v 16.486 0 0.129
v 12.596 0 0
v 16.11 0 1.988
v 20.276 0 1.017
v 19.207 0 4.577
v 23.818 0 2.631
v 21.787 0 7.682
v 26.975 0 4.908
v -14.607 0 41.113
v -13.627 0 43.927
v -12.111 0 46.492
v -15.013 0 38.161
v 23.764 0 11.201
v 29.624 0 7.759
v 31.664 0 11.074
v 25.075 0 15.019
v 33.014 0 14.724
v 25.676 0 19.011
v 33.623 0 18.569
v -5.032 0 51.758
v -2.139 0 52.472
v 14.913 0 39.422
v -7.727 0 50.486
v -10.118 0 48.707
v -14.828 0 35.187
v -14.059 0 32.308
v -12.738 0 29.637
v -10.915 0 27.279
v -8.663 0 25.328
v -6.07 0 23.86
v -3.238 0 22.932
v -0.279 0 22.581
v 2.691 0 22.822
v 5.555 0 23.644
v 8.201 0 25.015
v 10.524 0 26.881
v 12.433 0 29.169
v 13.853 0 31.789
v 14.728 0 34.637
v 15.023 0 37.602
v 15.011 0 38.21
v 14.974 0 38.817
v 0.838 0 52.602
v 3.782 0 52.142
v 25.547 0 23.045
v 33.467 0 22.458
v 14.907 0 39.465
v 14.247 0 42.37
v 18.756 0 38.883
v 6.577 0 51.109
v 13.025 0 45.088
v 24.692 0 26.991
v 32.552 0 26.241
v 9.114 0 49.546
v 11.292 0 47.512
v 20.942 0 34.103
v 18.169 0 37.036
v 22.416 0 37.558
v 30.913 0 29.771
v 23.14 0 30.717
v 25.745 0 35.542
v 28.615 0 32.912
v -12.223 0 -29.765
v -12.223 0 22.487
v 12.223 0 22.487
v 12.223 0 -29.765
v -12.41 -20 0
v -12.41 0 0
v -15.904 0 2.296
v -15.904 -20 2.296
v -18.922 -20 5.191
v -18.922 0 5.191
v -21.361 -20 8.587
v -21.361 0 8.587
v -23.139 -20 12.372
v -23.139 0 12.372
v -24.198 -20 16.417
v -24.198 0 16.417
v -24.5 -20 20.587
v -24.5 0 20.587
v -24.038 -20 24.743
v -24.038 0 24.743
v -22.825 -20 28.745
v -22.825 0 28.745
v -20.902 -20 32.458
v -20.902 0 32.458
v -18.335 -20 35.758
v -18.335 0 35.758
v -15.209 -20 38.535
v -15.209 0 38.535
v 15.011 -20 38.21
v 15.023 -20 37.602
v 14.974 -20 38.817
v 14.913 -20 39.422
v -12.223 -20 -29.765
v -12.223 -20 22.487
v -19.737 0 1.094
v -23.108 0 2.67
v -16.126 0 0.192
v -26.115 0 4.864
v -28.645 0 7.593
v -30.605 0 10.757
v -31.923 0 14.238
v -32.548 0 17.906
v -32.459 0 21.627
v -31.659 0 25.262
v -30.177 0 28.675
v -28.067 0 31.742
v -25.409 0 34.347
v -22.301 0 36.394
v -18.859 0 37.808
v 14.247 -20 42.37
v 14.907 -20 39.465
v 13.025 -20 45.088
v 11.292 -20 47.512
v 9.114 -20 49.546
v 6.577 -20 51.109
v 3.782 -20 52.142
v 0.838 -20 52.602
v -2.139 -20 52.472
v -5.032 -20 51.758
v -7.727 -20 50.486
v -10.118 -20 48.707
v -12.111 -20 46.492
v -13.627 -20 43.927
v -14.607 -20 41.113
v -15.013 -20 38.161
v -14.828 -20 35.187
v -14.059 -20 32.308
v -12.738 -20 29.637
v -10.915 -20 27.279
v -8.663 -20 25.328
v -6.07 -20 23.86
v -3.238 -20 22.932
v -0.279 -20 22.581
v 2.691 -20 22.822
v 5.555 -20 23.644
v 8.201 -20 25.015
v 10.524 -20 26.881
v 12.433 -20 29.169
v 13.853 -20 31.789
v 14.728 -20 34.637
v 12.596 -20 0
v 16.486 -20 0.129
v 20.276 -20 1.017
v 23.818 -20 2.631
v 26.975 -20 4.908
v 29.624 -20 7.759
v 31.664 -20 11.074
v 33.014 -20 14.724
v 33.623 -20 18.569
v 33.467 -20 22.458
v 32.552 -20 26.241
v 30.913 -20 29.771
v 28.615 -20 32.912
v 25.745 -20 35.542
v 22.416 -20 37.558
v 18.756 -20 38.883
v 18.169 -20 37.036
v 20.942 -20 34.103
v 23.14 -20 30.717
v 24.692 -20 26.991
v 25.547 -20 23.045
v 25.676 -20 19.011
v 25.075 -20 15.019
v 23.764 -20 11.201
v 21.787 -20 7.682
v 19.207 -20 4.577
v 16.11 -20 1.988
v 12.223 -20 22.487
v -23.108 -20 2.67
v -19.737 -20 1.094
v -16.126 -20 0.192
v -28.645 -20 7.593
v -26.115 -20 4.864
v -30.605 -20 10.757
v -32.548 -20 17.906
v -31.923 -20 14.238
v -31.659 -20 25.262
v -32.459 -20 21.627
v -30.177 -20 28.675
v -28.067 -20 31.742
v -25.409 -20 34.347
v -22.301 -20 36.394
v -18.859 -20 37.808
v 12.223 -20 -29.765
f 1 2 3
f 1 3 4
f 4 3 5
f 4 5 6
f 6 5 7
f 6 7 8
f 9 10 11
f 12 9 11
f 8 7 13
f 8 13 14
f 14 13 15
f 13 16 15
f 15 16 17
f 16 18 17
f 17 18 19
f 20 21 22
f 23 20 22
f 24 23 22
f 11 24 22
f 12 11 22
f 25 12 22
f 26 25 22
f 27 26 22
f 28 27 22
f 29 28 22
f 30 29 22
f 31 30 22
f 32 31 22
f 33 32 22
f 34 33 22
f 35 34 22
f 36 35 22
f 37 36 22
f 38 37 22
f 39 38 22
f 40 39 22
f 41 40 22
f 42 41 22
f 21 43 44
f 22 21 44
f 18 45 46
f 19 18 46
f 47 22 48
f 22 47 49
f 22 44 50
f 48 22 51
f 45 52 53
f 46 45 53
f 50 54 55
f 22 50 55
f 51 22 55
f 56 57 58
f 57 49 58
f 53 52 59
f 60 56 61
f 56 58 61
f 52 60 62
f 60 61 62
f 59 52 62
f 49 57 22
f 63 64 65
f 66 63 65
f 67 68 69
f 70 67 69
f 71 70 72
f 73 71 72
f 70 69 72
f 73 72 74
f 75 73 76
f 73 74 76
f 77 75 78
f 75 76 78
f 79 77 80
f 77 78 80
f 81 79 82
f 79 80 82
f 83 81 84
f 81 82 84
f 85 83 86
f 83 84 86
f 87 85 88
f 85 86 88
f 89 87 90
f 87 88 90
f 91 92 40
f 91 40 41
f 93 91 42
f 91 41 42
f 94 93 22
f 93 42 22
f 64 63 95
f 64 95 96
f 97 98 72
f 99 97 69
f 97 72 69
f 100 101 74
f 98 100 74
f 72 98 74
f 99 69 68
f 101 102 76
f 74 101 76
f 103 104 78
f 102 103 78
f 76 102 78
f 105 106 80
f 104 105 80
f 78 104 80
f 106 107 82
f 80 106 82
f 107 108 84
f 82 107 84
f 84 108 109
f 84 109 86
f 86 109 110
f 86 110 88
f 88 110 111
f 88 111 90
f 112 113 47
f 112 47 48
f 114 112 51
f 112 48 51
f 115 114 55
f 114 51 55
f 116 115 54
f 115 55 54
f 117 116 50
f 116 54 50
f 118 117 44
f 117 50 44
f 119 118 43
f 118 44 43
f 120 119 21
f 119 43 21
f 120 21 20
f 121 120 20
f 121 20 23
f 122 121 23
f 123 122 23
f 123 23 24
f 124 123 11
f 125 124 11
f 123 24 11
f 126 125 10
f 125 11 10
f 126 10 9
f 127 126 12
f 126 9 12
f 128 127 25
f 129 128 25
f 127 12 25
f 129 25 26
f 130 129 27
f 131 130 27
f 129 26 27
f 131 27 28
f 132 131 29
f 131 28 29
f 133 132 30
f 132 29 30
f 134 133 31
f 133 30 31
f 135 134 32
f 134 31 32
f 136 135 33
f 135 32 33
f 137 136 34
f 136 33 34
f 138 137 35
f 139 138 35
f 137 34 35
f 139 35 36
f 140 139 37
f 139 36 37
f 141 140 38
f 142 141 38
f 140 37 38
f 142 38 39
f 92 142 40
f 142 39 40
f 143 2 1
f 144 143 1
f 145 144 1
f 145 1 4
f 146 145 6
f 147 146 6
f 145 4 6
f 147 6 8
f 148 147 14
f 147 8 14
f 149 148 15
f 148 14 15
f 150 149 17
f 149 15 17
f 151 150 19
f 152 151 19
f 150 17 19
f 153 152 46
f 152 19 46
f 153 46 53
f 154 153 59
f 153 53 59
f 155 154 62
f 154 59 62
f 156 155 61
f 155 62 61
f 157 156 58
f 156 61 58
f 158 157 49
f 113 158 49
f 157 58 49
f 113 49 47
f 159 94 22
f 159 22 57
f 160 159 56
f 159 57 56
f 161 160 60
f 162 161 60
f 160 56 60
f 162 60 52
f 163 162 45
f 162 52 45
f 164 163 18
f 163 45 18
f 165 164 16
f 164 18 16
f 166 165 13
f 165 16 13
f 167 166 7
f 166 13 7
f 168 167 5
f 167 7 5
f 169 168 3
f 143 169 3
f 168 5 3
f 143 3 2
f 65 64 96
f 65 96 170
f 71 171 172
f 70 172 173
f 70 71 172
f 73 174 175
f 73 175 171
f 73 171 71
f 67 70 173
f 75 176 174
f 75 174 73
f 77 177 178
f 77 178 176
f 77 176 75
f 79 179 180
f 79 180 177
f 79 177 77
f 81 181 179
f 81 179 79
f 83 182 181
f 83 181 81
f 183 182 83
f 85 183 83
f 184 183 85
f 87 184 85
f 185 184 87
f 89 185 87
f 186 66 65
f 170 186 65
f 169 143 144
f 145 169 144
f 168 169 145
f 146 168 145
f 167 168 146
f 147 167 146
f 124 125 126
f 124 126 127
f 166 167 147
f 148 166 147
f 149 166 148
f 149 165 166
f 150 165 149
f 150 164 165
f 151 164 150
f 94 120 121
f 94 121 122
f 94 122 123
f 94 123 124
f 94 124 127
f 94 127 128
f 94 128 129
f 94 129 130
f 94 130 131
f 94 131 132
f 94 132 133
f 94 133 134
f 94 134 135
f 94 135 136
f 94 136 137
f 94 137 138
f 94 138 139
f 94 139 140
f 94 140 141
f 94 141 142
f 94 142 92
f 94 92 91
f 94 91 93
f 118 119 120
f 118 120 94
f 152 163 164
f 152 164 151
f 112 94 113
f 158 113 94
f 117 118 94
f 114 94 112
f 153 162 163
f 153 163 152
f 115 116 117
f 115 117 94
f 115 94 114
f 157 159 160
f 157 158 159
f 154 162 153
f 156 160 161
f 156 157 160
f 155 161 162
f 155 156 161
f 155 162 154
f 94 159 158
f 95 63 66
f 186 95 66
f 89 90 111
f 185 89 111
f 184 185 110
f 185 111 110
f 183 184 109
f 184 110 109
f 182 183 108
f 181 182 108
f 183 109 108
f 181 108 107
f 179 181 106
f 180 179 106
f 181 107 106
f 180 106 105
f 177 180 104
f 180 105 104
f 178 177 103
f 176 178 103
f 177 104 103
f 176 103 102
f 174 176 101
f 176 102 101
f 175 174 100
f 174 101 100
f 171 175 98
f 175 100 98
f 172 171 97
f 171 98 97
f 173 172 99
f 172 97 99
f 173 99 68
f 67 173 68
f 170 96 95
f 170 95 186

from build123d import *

# Parameters (mm, degrees)
F0_R     = 15.023375
F1_DEPTH = 20
F2_W     = 24.446092
F2_H     = 52.251186
F3_DEPTH = 20
F5_DEPTH = 20
F7_DEPTH = 20


with BuildPart() as f1:
    # F0 (on Front) → F1 (new body)
    with BuildSketch(Plane.XZ):
        with Locations((0, 37.602194)):
            Circle(F0_R)
    extrude(amount=F1_DEPTH)

    # F4 (on Front) → F5 (join)
    with BuildSketch(Plane.XZ):
        with BuildLine():
            ThreePointArc((14.835604, 39.468307), (25.678187, 19.055445), (12.59627, 0))
            ThreePointArc((12.59627, 0), (33.625551, 18.604531), (14.835604, 39.468307))
        make_face()
    extrude(amount=F5_DEPTH)


with BuildPart() as f3:
    # F2 (on Front) → F3 (new body)
    with BuildSketch(Plane.XZ):
        with Locations((1e-06, -3.638921)):
            Rectangle(F2_W, F2_H)
    extrude(amount=F3_DEPTH)


with BuildPart() as f7:
    # F6 (on Front) → F7 (new body)
    with BuildSketch(Plane.XZ):
        with BuildLine():
            ThreePointArc((-12.409657, 0), (-24.444685, 18.495074), (-15.208827, 38.535248))
            ThreePointArc((-15.208827, 38.535248), (-32.548473, 17.906421), (-12.409657, 0))
        make_face()
    extrude(amount=F7_DEPTH)


solid = Compound([f1.part, f3.part, f7.part])
